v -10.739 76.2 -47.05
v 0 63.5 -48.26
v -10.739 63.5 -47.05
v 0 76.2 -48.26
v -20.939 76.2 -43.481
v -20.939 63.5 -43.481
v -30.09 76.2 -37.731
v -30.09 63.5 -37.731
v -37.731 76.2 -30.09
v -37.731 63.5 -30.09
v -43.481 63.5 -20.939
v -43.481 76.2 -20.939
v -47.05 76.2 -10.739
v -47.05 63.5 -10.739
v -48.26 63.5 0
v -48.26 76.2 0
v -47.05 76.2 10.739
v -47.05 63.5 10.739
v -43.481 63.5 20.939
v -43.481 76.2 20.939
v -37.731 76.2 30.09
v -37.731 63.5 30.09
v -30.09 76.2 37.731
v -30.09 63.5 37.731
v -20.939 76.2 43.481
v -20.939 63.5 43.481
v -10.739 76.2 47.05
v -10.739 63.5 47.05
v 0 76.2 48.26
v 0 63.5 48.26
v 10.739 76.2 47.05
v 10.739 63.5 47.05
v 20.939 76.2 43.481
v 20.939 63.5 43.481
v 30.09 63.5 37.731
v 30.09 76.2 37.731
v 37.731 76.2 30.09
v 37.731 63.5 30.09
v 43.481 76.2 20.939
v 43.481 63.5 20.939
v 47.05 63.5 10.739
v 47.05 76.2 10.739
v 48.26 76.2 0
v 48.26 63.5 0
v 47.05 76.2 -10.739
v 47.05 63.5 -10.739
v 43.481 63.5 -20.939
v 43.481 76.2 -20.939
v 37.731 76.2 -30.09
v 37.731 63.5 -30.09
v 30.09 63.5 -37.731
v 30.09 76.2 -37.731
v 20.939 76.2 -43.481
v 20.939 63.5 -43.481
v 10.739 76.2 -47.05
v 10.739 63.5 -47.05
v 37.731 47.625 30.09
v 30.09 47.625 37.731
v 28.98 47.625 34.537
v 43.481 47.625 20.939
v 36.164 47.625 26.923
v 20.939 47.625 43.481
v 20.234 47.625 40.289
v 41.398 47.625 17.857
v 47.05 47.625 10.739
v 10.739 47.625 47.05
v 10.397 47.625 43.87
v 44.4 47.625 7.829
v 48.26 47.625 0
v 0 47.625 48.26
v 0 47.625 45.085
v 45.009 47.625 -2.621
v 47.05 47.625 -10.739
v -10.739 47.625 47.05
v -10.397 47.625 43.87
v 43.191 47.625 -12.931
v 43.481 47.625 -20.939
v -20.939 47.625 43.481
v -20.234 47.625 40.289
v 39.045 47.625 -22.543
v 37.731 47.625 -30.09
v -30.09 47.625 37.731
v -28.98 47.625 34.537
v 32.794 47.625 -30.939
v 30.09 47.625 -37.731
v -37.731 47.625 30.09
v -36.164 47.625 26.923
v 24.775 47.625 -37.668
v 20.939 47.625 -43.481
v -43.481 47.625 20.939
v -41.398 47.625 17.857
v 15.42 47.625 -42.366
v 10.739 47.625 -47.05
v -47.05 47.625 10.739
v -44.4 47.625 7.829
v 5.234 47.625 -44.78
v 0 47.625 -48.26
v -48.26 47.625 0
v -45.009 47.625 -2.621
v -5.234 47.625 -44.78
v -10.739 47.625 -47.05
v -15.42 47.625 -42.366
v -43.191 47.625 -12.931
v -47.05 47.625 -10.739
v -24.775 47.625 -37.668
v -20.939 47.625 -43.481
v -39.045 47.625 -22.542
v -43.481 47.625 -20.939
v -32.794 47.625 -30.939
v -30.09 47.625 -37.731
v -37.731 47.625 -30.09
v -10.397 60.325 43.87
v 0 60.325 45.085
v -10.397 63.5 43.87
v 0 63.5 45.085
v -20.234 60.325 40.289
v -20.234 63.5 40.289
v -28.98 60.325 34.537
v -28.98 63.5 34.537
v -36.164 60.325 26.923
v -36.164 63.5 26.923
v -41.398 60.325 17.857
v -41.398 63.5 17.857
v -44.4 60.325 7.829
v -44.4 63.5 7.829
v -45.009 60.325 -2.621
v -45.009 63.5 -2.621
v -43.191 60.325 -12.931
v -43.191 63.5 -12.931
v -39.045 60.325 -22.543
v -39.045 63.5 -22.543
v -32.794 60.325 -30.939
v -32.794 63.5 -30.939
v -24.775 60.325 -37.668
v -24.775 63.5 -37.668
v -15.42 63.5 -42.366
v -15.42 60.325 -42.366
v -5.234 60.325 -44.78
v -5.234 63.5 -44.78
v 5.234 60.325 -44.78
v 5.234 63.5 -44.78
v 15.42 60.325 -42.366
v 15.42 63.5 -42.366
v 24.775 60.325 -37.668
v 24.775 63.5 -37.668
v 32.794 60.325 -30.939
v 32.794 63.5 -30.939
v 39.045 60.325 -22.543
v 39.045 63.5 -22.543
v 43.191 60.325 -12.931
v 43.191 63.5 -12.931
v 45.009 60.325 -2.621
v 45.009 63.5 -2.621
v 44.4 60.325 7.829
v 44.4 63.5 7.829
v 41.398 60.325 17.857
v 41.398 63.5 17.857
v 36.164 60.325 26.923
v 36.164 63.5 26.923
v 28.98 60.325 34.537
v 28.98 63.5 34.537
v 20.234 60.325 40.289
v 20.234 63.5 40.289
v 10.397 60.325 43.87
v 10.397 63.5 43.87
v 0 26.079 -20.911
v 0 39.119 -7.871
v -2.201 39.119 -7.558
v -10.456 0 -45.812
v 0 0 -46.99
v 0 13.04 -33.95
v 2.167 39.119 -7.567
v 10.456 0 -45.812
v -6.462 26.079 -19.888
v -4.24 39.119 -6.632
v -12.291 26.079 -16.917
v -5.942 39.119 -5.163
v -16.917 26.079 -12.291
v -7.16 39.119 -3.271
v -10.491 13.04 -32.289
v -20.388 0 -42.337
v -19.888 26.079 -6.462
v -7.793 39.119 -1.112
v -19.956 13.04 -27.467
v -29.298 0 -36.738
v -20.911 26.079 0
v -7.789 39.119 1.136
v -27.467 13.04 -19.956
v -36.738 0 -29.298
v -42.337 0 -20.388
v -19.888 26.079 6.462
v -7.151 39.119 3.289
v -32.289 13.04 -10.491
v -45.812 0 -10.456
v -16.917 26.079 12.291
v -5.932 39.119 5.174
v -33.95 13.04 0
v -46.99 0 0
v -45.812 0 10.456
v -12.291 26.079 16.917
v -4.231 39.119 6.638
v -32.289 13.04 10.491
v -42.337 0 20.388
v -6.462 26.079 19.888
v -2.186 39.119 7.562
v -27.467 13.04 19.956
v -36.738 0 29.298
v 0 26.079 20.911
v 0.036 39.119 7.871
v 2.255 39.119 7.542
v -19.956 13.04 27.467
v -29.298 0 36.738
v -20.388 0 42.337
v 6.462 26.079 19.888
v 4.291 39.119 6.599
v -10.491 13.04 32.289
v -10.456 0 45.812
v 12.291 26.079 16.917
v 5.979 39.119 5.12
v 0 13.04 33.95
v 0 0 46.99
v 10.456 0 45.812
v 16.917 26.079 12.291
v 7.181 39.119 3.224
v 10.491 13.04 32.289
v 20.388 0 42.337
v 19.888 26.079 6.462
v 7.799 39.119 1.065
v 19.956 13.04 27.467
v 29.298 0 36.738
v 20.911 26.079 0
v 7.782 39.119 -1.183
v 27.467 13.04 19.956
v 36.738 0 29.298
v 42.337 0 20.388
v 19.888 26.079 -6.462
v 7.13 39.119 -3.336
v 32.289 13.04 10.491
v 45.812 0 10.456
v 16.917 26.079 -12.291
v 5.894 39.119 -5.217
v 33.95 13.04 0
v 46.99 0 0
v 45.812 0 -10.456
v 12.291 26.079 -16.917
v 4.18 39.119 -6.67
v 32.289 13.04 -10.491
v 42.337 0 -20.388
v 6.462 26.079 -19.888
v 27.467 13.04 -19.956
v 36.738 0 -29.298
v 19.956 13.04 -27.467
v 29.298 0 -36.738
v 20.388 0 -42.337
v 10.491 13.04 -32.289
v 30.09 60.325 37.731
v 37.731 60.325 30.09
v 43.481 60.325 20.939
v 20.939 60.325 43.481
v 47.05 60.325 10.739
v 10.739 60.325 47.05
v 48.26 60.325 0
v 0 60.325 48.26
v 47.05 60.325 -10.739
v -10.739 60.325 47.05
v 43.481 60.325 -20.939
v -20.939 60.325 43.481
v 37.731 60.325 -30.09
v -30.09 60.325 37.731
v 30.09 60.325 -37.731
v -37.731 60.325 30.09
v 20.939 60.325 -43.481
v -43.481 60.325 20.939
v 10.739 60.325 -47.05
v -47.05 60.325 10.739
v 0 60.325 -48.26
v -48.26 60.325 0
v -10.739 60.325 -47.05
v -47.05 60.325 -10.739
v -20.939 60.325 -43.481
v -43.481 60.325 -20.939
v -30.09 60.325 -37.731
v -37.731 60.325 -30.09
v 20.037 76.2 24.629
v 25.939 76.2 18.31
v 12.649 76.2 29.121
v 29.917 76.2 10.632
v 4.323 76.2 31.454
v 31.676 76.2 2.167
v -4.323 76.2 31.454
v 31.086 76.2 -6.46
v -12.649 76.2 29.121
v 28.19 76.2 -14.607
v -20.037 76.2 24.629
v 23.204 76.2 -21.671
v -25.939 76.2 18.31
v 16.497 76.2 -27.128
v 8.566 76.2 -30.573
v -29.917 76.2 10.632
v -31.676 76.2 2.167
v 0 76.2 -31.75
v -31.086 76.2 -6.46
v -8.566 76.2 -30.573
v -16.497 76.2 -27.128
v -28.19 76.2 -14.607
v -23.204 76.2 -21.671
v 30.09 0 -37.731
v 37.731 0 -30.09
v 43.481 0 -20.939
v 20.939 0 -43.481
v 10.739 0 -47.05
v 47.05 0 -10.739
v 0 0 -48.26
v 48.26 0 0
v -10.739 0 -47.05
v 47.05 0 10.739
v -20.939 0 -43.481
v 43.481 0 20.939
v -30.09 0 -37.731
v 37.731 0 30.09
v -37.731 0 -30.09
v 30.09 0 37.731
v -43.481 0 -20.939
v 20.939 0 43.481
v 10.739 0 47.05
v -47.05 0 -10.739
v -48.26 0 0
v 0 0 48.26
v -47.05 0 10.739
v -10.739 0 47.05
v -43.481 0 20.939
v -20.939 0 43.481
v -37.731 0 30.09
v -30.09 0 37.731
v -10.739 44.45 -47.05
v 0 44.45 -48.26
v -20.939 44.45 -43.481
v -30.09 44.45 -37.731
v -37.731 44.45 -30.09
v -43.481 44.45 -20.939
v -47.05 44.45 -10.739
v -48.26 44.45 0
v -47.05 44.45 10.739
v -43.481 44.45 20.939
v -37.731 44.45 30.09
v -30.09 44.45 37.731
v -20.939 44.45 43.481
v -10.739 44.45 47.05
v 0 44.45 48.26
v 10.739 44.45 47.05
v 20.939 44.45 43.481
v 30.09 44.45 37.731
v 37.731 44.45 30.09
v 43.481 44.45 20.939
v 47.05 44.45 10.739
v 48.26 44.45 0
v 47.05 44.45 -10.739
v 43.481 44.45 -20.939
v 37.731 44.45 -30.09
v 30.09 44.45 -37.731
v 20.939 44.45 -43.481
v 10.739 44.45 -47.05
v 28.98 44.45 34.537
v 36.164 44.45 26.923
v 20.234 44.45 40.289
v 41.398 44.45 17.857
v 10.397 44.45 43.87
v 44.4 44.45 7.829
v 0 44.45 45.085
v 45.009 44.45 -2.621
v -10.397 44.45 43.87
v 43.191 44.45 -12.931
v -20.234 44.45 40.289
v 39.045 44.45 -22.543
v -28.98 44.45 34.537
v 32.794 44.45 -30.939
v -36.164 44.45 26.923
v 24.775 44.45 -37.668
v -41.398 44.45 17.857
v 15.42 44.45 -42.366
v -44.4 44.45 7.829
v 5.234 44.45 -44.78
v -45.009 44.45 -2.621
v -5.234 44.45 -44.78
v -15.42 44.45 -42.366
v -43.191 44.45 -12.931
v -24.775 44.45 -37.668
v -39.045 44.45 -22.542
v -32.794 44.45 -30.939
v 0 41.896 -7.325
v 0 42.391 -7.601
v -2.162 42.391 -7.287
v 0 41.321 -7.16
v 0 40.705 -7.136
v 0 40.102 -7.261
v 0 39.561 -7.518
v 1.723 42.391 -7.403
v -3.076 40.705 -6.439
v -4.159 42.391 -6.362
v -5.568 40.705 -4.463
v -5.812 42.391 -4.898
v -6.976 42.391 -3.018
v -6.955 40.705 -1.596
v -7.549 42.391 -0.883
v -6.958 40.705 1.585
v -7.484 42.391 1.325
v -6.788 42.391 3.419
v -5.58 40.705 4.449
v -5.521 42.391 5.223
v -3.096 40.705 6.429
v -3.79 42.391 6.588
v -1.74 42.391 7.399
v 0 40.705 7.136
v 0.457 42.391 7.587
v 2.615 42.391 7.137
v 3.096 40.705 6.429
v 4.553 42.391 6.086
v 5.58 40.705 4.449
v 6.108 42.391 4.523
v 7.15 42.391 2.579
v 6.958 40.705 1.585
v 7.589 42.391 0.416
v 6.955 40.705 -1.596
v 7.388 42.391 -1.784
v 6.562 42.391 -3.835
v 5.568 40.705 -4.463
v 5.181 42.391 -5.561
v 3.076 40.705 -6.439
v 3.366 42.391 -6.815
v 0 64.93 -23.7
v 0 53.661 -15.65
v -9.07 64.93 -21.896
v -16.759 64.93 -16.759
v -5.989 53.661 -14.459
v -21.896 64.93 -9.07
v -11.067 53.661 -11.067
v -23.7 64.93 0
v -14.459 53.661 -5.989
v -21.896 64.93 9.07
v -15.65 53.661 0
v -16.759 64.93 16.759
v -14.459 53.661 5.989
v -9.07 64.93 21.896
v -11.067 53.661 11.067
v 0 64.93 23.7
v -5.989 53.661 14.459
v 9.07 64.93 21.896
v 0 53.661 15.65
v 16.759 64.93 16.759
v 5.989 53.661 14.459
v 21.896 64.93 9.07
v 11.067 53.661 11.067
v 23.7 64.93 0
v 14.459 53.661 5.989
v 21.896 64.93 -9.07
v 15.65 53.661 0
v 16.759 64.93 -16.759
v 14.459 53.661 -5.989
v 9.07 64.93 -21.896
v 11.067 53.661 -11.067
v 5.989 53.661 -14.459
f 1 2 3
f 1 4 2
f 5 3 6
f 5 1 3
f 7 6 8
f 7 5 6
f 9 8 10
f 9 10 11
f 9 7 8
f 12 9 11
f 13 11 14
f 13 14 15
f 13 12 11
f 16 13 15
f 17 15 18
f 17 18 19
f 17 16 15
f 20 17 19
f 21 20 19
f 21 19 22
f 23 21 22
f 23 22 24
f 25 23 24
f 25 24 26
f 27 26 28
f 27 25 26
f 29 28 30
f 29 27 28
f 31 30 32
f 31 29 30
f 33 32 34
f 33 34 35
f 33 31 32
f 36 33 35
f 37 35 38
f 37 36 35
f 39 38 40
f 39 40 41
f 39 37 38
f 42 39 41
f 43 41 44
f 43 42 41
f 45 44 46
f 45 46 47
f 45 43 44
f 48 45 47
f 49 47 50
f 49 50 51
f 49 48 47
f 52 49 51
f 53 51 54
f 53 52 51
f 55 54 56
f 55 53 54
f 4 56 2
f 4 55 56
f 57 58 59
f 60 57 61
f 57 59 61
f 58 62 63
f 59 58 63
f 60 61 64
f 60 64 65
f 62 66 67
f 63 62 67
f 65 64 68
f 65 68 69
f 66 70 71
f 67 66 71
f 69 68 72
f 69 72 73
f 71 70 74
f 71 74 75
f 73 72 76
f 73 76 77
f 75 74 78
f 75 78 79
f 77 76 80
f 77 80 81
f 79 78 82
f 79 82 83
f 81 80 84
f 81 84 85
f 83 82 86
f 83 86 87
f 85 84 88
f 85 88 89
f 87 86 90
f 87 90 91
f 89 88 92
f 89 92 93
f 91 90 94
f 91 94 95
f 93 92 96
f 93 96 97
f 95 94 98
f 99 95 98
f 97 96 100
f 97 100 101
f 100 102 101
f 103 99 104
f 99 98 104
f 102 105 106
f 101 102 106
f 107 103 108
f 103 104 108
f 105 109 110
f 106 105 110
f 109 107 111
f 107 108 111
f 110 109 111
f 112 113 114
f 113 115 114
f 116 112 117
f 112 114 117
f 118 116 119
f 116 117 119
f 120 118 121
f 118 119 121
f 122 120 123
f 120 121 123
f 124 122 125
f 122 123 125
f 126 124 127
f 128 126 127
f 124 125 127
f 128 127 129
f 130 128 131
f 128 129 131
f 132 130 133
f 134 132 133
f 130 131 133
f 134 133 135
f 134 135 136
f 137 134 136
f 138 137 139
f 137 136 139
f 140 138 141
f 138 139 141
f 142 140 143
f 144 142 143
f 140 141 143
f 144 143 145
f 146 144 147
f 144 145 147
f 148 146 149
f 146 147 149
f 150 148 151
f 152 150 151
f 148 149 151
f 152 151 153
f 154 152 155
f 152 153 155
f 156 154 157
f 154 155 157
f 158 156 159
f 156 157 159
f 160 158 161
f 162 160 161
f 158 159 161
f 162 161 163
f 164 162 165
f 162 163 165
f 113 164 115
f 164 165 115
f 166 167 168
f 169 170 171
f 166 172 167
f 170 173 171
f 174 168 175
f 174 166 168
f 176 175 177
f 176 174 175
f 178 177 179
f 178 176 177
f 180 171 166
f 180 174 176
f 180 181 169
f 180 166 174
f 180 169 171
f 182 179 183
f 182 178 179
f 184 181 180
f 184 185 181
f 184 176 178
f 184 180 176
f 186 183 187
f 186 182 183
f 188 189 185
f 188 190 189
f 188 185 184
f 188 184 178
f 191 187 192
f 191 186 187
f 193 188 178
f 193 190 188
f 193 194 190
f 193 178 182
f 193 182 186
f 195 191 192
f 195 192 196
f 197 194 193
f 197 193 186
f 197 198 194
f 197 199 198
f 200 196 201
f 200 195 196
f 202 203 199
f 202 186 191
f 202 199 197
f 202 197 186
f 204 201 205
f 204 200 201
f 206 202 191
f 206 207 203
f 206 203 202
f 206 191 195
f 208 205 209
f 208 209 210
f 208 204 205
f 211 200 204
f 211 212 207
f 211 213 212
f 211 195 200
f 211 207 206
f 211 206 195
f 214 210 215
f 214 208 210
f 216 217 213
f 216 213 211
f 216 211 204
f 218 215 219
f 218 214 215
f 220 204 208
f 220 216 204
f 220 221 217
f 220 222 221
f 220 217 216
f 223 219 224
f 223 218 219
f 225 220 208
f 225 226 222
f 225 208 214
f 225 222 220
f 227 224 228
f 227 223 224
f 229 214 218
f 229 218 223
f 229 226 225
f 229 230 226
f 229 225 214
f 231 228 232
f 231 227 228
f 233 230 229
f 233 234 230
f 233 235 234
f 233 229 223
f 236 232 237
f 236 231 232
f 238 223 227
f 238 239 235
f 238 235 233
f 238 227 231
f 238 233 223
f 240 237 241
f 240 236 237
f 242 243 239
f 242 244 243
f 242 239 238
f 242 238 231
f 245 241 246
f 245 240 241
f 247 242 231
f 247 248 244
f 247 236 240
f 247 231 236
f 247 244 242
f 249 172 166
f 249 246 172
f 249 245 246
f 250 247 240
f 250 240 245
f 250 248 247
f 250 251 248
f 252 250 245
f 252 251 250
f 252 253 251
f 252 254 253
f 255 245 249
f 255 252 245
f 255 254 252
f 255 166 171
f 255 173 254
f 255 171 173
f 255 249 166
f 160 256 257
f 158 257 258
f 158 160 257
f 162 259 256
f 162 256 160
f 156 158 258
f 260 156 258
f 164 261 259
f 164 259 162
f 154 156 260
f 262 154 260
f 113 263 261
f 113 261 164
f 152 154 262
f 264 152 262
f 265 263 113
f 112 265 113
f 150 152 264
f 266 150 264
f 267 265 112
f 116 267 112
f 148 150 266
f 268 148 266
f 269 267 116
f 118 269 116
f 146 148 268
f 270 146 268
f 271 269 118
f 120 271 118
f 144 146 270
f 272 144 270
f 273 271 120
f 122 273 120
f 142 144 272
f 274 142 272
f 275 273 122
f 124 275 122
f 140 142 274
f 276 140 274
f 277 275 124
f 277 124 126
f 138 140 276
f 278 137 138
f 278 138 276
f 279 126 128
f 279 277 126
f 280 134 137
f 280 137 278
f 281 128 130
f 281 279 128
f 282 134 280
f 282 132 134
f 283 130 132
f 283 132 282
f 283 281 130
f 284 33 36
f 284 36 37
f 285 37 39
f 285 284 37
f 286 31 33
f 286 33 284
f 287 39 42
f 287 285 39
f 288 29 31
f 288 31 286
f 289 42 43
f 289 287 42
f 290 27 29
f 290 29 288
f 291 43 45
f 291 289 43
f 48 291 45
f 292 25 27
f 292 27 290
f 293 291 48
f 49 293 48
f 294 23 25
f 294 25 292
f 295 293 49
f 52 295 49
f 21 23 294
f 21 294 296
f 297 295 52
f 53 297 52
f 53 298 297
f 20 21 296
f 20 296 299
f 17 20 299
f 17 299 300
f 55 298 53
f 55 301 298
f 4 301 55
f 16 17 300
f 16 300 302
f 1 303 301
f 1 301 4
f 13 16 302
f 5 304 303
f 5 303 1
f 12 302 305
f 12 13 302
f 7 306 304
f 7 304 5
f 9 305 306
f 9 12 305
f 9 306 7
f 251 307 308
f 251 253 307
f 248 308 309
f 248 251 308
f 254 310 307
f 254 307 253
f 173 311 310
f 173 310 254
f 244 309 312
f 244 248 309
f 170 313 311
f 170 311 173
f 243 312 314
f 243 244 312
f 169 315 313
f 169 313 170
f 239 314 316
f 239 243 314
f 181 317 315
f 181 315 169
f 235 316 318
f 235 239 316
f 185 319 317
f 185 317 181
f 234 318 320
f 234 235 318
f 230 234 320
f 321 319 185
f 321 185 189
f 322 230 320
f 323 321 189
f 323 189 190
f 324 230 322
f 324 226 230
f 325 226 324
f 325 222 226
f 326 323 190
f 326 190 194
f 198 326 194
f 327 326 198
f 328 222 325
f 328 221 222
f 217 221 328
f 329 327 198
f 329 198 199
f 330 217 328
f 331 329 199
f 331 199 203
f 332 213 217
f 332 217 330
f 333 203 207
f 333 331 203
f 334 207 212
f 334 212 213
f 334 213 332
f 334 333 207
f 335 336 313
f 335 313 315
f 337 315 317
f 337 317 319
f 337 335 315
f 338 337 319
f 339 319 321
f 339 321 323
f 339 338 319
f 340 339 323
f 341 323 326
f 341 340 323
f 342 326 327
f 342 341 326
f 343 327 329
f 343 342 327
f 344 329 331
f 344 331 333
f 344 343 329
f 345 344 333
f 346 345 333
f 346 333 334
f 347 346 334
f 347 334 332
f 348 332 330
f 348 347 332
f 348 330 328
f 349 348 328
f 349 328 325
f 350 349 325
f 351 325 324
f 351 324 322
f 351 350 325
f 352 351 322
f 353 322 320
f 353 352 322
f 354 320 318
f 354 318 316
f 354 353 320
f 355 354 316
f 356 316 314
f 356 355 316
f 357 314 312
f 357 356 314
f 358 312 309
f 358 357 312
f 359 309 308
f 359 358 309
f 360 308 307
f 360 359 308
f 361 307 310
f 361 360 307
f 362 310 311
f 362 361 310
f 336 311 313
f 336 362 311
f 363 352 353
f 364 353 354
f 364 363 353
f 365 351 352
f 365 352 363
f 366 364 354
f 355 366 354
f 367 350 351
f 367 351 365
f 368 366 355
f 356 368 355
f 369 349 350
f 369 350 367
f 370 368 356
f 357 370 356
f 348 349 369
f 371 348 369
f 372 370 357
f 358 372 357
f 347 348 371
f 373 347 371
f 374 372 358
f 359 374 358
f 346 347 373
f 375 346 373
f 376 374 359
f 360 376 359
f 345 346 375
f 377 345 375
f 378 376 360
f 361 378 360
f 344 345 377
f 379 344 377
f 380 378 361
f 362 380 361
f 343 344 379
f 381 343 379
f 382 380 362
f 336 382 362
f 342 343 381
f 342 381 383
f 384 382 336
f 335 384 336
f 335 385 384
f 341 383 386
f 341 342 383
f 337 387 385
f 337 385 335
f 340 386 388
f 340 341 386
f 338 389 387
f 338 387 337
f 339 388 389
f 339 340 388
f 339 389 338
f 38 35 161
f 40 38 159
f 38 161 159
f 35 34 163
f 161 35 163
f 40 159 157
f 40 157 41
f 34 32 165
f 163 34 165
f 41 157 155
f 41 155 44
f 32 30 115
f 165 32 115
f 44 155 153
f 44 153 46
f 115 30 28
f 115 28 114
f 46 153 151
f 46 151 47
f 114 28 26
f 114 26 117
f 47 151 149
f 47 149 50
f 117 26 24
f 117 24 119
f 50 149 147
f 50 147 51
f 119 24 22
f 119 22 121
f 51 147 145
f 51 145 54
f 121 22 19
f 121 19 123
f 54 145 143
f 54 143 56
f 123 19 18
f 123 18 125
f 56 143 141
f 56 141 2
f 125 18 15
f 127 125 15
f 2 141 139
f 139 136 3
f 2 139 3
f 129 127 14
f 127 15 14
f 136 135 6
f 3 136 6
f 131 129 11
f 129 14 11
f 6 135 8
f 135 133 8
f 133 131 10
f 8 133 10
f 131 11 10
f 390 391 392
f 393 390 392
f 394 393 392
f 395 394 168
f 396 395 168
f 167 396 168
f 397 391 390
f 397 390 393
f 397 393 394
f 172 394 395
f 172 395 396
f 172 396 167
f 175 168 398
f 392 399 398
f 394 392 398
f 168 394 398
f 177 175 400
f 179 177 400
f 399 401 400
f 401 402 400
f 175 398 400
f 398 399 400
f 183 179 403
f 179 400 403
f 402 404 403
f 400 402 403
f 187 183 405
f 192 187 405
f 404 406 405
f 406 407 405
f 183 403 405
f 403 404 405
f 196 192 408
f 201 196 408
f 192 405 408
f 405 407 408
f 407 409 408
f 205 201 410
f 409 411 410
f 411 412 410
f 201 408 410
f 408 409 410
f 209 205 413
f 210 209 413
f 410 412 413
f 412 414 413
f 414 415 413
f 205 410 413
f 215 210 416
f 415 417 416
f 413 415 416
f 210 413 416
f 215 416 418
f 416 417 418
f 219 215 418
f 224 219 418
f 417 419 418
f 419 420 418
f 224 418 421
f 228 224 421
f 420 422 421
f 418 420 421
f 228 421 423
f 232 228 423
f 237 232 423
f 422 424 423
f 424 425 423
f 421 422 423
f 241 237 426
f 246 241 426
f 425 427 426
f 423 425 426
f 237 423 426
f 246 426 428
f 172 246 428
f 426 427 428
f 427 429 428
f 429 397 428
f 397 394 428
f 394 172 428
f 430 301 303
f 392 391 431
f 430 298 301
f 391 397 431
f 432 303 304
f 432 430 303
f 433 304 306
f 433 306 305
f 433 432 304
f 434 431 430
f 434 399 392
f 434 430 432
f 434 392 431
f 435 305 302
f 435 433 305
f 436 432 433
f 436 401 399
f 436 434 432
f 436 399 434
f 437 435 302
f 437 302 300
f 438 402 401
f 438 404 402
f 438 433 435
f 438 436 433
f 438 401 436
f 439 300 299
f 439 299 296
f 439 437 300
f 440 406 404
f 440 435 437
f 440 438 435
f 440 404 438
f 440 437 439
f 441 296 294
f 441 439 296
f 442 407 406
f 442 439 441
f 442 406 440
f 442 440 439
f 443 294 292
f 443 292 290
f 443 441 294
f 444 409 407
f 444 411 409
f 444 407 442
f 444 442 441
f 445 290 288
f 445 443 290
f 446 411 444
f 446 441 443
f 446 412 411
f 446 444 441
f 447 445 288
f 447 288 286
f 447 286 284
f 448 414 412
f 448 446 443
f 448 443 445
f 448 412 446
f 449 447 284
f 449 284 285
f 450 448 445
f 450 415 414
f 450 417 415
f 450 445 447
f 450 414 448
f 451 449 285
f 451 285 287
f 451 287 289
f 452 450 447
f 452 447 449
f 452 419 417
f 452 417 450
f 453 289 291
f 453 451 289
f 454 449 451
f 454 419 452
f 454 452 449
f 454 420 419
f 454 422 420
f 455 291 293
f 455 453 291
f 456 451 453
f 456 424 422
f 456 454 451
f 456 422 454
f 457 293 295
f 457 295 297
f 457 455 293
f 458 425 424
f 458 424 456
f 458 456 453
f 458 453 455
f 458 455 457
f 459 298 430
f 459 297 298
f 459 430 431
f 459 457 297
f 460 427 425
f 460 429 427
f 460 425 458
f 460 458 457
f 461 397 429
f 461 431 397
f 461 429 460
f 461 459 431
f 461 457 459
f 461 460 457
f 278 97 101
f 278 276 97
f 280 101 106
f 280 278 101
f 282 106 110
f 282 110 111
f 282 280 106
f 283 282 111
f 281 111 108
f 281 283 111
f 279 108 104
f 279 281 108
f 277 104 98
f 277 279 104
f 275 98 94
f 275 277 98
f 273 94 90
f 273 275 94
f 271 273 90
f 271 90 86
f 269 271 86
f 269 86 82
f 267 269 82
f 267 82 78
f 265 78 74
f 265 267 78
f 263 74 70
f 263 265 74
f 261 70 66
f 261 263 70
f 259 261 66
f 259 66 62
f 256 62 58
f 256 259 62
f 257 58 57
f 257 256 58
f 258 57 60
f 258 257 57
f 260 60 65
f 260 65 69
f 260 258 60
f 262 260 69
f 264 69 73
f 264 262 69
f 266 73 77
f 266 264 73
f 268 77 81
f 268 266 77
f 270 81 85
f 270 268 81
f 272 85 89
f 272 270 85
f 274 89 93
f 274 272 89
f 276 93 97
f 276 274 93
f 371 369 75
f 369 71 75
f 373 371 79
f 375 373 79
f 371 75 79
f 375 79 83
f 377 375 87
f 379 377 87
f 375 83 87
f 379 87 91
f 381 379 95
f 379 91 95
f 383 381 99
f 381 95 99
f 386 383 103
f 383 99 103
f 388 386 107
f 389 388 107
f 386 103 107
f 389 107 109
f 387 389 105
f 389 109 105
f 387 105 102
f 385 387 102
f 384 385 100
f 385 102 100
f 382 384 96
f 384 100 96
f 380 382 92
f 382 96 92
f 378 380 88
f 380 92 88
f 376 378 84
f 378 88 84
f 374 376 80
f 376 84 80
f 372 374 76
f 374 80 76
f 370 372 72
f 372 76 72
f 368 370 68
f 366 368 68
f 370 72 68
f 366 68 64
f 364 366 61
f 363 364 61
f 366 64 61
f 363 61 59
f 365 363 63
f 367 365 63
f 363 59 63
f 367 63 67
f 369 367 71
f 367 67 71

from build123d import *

# Parameters (mm, degrees)
FILLET1_R   = 2.54
SKETCH3_W   = 20.447112079
SKETCH3_H   = 3.175
SKETCH3_W_2 = 12.7


with BuildPart() as part:
    # Sketch2 → Revolve1 (revolve)
    with BuildSketch(Plane.XY, mode=Mode.PRIVATE) as revolve1_sk:
        Polygon((48.26, 0), (48.26, 76.2), (31.75, 76.2), (6.35, 40.64), (46.99, 0), align=None)
    revolve(revolve1_sk.sketch.rotate(Axis((0, 0, 0), (0, 1, 0)), 90), axis=Axis((0, 0, 0), (0, 1, 0)))

    # Fillet1
    fillet1_edges = [part.edges().sort_by_distance(p)[0] for p in [
        (0, 40.64, 6.35),
    ]]
    fillet(fillet1_edges, radius=FILLET1_R)

    # Sketch3 → Cut-Revolve1 (revolve, cut)
    with BuildSketch(Plane.XY, mode=Mode.PRIVATE) as cut_revolve1_sk:
        with Locations((55.30855604, 61.9125)):
            Rectangle(SKETCH3_W, SKETCH3_H)
        with Locations((51.435, 46.0375)):
            Rectangle(SKETCH3_W_2, SKETCH3_H)
    revolve(cut_revolve1_sk.sketch.rotate(Axis((0, 0, 0), (0, -1, 0)), 90), axis=Axis((0, 0, 0), (0, -1, 0)), mode=Mode.SUBTRACT)


solid = part.part
